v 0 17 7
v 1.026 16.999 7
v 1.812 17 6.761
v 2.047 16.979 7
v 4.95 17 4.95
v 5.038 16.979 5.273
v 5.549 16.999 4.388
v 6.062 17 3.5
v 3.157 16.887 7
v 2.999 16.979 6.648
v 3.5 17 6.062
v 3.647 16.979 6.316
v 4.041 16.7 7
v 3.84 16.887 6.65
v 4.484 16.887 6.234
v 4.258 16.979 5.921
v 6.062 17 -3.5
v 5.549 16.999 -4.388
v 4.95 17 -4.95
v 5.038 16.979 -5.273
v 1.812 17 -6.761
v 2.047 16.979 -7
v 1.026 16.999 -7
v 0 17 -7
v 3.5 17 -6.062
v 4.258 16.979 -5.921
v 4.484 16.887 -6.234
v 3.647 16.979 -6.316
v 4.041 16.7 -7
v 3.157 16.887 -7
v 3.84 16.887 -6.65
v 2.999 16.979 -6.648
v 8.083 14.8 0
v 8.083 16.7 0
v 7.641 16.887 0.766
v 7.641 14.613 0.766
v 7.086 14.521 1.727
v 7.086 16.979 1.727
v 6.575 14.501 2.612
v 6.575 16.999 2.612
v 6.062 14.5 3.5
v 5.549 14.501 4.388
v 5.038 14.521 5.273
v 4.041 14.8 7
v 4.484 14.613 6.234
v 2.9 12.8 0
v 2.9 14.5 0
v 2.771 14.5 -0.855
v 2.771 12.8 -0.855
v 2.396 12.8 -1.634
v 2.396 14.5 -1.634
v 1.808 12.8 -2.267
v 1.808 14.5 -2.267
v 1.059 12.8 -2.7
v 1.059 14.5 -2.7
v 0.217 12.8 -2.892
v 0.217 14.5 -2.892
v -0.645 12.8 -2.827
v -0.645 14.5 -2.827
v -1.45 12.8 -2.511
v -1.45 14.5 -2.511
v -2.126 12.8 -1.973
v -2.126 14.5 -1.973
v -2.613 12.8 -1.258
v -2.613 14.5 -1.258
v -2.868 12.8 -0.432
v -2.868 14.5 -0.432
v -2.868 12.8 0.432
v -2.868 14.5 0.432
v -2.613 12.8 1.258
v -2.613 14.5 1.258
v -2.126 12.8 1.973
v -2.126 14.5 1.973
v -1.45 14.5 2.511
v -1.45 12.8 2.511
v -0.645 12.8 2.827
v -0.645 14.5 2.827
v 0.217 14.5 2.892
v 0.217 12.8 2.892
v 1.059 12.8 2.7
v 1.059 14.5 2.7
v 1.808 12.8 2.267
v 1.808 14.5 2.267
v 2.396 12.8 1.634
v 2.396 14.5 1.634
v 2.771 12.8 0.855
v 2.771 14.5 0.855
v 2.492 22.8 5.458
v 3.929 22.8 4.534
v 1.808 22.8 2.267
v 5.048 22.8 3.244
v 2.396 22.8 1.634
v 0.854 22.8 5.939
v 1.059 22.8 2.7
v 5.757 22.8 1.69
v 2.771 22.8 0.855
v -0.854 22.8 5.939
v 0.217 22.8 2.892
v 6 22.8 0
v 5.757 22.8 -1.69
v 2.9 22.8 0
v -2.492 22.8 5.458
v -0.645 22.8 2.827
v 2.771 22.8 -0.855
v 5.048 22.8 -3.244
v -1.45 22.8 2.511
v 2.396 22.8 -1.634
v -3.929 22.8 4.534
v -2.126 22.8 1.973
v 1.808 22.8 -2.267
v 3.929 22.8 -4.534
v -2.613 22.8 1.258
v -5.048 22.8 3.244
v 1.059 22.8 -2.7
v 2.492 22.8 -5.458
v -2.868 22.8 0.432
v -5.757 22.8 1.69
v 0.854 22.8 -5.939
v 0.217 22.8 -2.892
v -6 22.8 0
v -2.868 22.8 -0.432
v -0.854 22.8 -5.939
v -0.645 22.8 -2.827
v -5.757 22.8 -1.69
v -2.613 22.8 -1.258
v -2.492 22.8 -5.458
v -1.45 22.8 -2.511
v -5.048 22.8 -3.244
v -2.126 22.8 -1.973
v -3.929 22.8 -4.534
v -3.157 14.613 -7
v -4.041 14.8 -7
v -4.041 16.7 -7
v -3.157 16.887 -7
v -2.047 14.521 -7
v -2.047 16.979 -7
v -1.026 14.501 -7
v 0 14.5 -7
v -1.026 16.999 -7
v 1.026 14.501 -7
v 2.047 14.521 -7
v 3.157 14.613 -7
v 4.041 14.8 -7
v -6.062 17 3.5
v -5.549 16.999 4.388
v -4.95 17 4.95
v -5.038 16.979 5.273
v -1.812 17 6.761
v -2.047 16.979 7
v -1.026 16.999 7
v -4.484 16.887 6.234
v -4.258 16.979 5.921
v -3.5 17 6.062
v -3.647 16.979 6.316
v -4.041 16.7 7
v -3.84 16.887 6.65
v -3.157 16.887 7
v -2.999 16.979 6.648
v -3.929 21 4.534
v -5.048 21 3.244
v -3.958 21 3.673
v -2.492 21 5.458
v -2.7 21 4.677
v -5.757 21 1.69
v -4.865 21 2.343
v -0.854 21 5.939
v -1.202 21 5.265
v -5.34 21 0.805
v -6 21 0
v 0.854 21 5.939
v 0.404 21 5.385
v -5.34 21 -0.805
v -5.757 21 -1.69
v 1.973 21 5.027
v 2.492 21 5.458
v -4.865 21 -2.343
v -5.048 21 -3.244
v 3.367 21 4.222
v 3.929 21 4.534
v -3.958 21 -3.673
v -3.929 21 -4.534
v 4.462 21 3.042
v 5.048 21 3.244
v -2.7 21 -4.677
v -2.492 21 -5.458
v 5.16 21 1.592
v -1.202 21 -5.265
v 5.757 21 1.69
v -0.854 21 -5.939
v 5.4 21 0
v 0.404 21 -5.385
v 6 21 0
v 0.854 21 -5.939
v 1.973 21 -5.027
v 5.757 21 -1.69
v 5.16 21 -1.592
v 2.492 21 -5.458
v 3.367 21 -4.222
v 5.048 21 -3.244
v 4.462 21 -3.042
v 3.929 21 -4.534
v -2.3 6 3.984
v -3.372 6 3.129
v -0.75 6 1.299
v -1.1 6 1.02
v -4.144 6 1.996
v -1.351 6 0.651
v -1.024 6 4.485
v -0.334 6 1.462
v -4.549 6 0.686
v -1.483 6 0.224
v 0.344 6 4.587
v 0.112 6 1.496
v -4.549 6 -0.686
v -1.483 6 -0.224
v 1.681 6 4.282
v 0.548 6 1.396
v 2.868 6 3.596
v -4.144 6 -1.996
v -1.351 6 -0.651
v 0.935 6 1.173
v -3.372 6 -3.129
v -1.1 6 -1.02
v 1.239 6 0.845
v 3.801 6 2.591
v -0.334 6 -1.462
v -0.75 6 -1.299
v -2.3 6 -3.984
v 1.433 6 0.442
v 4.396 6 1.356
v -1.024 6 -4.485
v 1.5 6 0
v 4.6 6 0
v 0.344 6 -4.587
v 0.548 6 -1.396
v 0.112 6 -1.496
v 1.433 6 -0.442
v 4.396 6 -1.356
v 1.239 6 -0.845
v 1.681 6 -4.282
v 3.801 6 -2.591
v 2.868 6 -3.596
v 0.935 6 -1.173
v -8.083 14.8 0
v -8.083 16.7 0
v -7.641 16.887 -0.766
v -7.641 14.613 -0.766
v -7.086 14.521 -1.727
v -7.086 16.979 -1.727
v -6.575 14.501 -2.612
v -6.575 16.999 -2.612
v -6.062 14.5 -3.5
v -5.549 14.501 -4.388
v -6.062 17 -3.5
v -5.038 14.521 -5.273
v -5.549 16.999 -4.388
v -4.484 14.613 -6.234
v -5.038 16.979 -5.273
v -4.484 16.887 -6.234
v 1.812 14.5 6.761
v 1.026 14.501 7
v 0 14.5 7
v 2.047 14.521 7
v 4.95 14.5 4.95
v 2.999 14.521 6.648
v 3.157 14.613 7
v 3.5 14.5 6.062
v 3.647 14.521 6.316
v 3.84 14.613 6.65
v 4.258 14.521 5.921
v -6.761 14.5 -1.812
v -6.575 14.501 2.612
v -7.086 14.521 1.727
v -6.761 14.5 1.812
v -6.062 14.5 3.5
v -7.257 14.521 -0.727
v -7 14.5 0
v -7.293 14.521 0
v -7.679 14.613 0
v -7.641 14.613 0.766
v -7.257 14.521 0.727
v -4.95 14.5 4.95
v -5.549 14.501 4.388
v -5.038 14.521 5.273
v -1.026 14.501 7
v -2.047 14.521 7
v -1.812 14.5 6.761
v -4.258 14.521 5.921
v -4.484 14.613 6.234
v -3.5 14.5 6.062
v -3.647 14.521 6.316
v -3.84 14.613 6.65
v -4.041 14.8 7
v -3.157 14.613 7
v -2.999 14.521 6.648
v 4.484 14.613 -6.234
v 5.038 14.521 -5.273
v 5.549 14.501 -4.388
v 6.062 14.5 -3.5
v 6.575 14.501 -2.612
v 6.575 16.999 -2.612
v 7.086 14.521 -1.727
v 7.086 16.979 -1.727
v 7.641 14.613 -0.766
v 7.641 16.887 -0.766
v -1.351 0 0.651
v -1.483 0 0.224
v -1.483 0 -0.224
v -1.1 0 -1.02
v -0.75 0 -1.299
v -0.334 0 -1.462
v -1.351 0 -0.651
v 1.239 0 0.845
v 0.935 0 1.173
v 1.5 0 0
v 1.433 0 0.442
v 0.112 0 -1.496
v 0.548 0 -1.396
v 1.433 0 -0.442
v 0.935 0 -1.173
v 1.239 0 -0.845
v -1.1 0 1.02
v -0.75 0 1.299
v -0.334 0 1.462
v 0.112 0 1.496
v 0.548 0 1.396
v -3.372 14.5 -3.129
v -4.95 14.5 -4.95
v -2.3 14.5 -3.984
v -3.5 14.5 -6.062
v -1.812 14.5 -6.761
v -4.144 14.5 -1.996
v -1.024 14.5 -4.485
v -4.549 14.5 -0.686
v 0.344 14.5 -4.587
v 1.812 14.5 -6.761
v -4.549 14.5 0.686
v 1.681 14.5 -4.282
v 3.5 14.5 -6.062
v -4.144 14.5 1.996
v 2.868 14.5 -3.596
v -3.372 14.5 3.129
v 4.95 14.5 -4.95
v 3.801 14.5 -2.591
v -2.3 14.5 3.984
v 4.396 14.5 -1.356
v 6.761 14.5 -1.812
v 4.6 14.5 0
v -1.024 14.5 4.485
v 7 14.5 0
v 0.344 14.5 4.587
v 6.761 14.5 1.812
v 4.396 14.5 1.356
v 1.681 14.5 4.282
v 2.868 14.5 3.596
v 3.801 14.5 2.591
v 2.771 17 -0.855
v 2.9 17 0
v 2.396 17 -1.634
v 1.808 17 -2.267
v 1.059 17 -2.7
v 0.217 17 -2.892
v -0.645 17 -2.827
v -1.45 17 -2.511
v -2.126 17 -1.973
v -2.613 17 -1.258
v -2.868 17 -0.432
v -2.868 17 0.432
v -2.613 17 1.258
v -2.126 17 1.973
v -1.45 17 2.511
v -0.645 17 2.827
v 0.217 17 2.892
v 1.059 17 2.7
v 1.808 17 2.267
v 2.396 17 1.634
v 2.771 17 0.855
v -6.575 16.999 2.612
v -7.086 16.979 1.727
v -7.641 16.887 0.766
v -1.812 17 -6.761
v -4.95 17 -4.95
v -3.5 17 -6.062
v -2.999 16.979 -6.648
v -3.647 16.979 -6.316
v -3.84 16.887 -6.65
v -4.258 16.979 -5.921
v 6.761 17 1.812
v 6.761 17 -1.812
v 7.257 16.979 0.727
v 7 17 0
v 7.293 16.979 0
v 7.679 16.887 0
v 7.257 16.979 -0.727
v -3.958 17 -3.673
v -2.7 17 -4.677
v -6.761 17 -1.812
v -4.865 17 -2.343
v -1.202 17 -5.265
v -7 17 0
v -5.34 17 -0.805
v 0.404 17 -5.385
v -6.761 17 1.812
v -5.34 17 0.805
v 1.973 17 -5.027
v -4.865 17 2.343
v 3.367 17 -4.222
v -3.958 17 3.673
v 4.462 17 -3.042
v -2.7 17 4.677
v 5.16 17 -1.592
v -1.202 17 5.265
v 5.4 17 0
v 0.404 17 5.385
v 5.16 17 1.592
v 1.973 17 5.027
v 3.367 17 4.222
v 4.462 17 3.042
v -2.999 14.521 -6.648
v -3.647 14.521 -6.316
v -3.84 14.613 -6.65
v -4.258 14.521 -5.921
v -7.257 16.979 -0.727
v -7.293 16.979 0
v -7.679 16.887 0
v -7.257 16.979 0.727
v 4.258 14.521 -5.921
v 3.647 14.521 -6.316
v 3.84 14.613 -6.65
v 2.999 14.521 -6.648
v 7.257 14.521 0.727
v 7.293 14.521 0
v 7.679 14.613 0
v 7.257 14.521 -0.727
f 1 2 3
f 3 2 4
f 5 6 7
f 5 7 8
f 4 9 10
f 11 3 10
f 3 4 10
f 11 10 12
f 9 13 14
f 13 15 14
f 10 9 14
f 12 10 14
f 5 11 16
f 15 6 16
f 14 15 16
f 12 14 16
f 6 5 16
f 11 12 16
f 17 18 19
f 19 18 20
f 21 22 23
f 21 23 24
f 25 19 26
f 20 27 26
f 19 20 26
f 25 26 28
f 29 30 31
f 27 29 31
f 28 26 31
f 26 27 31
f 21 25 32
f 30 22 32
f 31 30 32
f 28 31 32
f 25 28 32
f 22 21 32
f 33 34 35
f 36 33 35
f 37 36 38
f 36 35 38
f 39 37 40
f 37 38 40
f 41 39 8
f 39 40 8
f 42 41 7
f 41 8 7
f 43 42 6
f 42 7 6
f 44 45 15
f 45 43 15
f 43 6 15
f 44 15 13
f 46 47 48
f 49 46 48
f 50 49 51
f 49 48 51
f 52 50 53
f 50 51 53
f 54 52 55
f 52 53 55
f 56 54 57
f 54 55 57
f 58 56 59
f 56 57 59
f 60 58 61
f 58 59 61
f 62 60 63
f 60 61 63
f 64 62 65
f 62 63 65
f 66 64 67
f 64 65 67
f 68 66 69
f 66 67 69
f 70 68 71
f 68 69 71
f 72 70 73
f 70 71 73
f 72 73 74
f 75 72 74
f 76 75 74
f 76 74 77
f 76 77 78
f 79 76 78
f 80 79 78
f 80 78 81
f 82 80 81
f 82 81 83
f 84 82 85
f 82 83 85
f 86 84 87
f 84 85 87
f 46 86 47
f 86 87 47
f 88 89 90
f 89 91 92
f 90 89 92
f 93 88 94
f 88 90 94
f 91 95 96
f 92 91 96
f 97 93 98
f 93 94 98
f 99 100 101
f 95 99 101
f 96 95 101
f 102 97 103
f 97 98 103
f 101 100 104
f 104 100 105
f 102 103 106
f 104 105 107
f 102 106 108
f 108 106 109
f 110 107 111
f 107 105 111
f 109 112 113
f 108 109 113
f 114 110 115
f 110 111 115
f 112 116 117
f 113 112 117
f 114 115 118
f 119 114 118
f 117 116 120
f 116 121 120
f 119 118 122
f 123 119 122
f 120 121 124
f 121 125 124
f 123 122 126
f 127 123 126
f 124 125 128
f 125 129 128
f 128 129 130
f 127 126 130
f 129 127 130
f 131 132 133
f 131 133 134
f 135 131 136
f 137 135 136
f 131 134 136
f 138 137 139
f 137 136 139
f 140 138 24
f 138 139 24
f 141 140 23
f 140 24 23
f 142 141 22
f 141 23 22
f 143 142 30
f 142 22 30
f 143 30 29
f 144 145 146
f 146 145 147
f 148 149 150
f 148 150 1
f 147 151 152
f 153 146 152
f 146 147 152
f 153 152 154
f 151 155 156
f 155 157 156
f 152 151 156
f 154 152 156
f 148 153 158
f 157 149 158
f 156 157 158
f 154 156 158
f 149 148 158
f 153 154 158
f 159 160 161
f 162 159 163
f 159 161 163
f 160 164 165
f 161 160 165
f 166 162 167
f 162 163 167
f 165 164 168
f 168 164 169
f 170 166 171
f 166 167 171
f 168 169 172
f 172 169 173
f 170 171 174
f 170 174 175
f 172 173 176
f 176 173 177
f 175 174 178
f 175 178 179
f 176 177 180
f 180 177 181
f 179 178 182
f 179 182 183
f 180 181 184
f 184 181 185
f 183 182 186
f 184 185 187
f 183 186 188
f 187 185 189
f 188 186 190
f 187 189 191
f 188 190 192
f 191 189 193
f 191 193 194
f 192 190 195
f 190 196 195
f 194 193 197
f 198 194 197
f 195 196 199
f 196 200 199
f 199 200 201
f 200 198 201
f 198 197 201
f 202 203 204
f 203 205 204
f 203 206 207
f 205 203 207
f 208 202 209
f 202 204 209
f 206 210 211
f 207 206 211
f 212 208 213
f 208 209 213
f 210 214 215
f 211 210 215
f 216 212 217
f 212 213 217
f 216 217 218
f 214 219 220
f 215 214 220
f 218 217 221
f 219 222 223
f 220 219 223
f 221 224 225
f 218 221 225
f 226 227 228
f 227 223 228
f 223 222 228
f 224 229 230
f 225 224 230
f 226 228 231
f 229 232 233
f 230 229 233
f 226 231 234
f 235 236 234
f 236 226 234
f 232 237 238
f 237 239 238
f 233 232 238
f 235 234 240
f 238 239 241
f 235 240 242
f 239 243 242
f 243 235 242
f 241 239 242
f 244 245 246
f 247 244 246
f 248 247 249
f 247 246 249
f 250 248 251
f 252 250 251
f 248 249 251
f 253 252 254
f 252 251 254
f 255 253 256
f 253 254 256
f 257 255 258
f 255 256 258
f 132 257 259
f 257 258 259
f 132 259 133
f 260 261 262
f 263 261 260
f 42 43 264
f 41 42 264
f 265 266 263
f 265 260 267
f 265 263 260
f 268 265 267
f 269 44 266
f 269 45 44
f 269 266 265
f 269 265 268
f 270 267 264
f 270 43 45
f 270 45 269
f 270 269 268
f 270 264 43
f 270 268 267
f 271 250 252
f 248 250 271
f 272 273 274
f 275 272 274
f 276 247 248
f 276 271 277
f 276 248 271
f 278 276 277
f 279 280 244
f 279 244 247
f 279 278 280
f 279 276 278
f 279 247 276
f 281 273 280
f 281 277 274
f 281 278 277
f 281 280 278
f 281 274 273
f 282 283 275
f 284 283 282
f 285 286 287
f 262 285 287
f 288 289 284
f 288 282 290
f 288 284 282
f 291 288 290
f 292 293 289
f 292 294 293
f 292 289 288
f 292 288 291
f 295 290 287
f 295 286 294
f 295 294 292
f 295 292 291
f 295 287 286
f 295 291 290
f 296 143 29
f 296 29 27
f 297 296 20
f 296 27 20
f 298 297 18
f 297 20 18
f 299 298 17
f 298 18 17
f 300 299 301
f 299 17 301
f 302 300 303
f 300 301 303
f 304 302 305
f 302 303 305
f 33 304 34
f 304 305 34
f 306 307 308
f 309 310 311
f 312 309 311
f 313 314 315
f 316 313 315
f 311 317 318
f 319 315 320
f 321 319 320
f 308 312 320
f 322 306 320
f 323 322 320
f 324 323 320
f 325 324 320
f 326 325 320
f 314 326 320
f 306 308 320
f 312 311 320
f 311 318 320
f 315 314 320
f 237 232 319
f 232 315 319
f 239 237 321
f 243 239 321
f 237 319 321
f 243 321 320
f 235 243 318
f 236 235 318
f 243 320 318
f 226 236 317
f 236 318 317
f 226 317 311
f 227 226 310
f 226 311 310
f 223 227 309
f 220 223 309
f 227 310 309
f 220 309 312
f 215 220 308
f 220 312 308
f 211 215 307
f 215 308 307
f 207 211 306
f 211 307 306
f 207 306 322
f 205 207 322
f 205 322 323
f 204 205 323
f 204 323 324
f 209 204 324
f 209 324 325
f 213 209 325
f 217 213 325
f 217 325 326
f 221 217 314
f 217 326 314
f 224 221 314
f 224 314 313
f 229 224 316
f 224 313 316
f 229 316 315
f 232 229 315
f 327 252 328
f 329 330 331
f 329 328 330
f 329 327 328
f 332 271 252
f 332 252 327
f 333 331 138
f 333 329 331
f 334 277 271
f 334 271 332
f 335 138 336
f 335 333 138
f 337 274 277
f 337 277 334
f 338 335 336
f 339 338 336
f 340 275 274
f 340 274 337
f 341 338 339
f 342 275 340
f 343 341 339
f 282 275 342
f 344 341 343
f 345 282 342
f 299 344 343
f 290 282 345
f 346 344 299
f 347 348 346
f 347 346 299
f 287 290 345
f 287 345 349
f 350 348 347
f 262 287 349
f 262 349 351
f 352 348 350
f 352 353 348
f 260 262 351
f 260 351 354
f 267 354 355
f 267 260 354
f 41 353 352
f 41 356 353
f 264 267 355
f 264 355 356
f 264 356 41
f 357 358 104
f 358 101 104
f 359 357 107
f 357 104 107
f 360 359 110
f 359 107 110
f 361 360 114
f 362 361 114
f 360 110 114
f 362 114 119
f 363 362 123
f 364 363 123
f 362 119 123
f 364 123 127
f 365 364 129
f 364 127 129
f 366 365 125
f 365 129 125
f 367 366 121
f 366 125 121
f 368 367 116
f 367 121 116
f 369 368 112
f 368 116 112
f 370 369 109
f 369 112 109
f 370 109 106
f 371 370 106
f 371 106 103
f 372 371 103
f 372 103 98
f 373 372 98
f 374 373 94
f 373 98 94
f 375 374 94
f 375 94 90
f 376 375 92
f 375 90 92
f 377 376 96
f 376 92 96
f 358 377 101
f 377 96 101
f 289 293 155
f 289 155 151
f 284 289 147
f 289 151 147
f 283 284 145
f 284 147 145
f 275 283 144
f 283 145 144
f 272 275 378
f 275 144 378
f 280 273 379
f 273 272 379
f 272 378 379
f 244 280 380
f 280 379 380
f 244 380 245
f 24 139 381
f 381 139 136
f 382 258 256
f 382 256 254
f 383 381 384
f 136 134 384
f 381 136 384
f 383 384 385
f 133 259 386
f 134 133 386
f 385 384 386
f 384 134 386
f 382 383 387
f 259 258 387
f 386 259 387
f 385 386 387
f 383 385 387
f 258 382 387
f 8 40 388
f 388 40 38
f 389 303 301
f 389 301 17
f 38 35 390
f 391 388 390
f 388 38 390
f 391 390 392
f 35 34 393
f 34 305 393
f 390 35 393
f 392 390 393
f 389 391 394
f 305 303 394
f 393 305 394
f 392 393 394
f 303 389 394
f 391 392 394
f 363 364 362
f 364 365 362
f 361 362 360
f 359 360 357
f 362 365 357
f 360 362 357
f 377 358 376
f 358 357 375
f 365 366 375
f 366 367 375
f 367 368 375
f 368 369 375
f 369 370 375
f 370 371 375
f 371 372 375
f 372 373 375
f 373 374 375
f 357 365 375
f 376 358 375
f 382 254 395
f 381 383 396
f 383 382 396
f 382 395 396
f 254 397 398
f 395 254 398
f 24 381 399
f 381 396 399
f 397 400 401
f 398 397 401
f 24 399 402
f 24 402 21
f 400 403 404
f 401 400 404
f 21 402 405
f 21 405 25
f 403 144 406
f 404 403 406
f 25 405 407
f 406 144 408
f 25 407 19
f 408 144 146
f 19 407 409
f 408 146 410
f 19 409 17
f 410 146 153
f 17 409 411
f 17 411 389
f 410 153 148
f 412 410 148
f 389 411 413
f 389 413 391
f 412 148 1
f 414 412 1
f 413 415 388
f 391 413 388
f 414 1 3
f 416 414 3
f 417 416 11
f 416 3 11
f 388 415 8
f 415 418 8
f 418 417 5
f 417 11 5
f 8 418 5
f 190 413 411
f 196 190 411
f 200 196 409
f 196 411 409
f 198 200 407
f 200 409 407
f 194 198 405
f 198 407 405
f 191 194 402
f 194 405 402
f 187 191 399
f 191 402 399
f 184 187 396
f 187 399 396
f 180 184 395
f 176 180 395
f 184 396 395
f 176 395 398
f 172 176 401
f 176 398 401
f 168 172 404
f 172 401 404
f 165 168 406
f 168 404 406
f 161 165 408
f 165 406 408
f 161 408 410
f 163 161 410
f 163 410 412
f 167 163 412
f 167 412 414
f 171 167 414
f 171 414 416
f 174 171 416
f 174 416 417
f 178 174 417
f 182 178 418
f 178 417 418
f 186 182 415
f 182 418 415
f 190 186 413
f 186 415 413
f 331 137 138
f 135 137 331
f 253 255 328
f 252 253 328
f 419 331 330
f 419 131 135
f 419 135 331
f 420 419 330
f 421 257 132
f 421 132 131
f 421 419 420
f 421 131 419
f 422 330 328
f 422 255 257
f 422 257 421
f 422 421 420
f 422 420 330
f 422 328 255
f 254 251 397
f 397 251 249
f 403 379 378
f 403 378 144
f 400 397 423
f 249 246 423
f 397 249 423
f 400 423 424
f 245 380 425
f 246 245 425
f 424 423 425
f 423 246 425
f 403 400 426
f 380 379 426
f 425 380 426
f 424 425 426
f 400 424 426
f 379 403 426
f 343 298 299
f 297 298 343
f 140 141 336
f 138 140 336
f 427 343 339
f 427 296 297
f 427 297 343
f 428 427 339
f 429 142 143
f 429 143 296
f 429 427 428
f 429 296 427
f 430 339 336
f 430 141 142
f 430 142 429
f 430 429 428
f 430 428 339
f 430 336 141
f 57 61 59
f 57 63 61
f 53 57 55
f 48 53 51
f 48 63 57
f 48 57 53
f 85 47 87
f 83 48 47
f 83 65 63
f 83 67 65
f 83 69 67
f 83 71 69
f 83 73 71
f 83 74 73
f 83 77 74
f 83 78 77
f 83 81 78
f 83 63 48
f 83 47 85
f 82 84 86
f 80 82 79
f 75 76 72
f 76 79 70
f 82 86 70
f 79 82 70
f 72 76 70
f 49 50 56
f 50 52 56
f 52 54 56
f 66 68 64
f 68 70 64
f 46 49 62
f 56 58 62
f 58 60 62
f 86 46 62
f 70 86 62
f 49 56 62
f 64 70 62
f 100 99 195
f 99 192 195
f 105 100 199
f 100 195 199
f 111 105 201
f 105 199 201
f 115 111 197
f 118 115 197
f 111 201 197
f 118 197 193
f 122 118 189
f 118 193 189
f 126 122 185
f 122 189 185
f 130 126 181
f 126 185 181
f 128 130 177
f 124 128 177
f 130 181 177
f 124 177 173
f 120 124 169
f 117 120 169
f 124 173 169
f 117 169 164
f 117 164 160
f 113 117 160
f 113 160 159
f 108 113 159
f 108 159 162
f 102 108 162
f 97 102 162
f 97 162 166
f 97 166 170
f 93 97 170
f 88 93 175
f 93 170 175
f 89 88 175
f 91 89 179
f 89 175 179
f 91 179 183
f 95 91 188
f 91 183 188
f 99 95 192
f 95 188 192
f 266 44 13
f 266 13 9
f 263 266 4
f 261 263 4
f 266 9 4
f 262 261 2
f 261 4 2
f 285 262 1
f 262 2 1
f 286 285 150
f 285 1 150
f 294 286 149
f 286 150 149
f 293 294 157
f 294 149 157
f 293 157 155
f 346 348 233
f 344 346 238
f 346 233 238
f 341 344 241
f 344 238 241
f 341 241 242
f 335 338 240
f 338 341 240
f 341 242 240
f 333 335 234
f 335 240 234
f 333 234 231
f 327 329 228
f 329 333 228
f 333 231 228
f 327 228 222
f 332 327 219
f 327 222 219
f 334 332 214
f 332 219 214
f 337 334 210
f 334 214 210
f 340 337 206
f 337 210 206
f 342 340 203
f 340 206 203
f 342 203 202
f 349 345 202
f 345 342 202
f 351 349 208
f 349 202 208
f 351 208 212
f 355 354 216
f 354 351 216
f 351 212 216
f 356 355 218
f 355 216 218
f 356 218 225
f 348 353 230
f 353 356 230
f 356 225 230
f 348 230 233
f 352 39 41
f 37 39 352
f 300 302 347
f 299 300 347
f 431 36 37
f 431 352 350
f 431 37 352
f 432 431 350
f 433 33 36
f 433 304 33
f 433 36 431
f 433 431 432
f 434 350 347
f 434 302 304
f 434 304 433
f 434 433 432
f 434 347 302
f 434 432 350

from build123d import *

# Parameters (mm, degrees)
BOSS_EXTRUDE1_START = 4
BOSS_EXTRUDE1_DEPTH = 2.5


with BuildPart() as part:
    # Sketch1 → Revolve1 (revolve)
    with BuildSketch(Plane.XY):
        Polygon((0, 0), (0, 12.8), (2.9, 12.8), (2.9, 22.8), (6, 22.8), (6, 21), (5.4, 21), (5.4, 16), (4.6, 16), (4.6, 6), (1.5, 6), (1.5, 0), align=None)
    revolve(axis=Axis((0, 0, 0), (0, 1, 0)))

    # Sketch2 → Boss-Extrude1 (add)
    with BuildSketch(Plane.XZ.offset(-21).offset(BOSS_EXTRUDE1_START)):
        Polygon((8.082903769, 0), (4.041451884, 7), (-4.041451884, 7), (-8.082903769, 0), (-4.041451884, -7), (4.041451884, -7), align=None)
    extrude(amount=BOSS_EXTRUDE1_DEPTH)

    # Sketch3 → Cut-Revolve1 (revolve, cut)
    with BuildSketch(Plane.XY):
        with BuildLine():
            Line((-8.082903769, 16.7), (-8.082903769, 17))
            Line((-8.082903769, 17), (-7, 17))
            ThreePointArc((-7, 17), (-7.561845302, 16.923613695), (-8.082903769, 16.7))
        make_face()
        with BuildLine():
            Line((-8.082903769, 14.8), (-8.082903769, 14.5))
            Line((-8.082903769, 14.5), (-7, 14.5))
            ThreePointArc((-7, 14.5), (-7.561845302, 14.576386305), (-8.082903769, 14.8))
        make_face()
    revolve(axis=Axis((0, 14.5, 0), (0, 1, 0)), mode=Mode.SUBTRACT)


solid = part.part
